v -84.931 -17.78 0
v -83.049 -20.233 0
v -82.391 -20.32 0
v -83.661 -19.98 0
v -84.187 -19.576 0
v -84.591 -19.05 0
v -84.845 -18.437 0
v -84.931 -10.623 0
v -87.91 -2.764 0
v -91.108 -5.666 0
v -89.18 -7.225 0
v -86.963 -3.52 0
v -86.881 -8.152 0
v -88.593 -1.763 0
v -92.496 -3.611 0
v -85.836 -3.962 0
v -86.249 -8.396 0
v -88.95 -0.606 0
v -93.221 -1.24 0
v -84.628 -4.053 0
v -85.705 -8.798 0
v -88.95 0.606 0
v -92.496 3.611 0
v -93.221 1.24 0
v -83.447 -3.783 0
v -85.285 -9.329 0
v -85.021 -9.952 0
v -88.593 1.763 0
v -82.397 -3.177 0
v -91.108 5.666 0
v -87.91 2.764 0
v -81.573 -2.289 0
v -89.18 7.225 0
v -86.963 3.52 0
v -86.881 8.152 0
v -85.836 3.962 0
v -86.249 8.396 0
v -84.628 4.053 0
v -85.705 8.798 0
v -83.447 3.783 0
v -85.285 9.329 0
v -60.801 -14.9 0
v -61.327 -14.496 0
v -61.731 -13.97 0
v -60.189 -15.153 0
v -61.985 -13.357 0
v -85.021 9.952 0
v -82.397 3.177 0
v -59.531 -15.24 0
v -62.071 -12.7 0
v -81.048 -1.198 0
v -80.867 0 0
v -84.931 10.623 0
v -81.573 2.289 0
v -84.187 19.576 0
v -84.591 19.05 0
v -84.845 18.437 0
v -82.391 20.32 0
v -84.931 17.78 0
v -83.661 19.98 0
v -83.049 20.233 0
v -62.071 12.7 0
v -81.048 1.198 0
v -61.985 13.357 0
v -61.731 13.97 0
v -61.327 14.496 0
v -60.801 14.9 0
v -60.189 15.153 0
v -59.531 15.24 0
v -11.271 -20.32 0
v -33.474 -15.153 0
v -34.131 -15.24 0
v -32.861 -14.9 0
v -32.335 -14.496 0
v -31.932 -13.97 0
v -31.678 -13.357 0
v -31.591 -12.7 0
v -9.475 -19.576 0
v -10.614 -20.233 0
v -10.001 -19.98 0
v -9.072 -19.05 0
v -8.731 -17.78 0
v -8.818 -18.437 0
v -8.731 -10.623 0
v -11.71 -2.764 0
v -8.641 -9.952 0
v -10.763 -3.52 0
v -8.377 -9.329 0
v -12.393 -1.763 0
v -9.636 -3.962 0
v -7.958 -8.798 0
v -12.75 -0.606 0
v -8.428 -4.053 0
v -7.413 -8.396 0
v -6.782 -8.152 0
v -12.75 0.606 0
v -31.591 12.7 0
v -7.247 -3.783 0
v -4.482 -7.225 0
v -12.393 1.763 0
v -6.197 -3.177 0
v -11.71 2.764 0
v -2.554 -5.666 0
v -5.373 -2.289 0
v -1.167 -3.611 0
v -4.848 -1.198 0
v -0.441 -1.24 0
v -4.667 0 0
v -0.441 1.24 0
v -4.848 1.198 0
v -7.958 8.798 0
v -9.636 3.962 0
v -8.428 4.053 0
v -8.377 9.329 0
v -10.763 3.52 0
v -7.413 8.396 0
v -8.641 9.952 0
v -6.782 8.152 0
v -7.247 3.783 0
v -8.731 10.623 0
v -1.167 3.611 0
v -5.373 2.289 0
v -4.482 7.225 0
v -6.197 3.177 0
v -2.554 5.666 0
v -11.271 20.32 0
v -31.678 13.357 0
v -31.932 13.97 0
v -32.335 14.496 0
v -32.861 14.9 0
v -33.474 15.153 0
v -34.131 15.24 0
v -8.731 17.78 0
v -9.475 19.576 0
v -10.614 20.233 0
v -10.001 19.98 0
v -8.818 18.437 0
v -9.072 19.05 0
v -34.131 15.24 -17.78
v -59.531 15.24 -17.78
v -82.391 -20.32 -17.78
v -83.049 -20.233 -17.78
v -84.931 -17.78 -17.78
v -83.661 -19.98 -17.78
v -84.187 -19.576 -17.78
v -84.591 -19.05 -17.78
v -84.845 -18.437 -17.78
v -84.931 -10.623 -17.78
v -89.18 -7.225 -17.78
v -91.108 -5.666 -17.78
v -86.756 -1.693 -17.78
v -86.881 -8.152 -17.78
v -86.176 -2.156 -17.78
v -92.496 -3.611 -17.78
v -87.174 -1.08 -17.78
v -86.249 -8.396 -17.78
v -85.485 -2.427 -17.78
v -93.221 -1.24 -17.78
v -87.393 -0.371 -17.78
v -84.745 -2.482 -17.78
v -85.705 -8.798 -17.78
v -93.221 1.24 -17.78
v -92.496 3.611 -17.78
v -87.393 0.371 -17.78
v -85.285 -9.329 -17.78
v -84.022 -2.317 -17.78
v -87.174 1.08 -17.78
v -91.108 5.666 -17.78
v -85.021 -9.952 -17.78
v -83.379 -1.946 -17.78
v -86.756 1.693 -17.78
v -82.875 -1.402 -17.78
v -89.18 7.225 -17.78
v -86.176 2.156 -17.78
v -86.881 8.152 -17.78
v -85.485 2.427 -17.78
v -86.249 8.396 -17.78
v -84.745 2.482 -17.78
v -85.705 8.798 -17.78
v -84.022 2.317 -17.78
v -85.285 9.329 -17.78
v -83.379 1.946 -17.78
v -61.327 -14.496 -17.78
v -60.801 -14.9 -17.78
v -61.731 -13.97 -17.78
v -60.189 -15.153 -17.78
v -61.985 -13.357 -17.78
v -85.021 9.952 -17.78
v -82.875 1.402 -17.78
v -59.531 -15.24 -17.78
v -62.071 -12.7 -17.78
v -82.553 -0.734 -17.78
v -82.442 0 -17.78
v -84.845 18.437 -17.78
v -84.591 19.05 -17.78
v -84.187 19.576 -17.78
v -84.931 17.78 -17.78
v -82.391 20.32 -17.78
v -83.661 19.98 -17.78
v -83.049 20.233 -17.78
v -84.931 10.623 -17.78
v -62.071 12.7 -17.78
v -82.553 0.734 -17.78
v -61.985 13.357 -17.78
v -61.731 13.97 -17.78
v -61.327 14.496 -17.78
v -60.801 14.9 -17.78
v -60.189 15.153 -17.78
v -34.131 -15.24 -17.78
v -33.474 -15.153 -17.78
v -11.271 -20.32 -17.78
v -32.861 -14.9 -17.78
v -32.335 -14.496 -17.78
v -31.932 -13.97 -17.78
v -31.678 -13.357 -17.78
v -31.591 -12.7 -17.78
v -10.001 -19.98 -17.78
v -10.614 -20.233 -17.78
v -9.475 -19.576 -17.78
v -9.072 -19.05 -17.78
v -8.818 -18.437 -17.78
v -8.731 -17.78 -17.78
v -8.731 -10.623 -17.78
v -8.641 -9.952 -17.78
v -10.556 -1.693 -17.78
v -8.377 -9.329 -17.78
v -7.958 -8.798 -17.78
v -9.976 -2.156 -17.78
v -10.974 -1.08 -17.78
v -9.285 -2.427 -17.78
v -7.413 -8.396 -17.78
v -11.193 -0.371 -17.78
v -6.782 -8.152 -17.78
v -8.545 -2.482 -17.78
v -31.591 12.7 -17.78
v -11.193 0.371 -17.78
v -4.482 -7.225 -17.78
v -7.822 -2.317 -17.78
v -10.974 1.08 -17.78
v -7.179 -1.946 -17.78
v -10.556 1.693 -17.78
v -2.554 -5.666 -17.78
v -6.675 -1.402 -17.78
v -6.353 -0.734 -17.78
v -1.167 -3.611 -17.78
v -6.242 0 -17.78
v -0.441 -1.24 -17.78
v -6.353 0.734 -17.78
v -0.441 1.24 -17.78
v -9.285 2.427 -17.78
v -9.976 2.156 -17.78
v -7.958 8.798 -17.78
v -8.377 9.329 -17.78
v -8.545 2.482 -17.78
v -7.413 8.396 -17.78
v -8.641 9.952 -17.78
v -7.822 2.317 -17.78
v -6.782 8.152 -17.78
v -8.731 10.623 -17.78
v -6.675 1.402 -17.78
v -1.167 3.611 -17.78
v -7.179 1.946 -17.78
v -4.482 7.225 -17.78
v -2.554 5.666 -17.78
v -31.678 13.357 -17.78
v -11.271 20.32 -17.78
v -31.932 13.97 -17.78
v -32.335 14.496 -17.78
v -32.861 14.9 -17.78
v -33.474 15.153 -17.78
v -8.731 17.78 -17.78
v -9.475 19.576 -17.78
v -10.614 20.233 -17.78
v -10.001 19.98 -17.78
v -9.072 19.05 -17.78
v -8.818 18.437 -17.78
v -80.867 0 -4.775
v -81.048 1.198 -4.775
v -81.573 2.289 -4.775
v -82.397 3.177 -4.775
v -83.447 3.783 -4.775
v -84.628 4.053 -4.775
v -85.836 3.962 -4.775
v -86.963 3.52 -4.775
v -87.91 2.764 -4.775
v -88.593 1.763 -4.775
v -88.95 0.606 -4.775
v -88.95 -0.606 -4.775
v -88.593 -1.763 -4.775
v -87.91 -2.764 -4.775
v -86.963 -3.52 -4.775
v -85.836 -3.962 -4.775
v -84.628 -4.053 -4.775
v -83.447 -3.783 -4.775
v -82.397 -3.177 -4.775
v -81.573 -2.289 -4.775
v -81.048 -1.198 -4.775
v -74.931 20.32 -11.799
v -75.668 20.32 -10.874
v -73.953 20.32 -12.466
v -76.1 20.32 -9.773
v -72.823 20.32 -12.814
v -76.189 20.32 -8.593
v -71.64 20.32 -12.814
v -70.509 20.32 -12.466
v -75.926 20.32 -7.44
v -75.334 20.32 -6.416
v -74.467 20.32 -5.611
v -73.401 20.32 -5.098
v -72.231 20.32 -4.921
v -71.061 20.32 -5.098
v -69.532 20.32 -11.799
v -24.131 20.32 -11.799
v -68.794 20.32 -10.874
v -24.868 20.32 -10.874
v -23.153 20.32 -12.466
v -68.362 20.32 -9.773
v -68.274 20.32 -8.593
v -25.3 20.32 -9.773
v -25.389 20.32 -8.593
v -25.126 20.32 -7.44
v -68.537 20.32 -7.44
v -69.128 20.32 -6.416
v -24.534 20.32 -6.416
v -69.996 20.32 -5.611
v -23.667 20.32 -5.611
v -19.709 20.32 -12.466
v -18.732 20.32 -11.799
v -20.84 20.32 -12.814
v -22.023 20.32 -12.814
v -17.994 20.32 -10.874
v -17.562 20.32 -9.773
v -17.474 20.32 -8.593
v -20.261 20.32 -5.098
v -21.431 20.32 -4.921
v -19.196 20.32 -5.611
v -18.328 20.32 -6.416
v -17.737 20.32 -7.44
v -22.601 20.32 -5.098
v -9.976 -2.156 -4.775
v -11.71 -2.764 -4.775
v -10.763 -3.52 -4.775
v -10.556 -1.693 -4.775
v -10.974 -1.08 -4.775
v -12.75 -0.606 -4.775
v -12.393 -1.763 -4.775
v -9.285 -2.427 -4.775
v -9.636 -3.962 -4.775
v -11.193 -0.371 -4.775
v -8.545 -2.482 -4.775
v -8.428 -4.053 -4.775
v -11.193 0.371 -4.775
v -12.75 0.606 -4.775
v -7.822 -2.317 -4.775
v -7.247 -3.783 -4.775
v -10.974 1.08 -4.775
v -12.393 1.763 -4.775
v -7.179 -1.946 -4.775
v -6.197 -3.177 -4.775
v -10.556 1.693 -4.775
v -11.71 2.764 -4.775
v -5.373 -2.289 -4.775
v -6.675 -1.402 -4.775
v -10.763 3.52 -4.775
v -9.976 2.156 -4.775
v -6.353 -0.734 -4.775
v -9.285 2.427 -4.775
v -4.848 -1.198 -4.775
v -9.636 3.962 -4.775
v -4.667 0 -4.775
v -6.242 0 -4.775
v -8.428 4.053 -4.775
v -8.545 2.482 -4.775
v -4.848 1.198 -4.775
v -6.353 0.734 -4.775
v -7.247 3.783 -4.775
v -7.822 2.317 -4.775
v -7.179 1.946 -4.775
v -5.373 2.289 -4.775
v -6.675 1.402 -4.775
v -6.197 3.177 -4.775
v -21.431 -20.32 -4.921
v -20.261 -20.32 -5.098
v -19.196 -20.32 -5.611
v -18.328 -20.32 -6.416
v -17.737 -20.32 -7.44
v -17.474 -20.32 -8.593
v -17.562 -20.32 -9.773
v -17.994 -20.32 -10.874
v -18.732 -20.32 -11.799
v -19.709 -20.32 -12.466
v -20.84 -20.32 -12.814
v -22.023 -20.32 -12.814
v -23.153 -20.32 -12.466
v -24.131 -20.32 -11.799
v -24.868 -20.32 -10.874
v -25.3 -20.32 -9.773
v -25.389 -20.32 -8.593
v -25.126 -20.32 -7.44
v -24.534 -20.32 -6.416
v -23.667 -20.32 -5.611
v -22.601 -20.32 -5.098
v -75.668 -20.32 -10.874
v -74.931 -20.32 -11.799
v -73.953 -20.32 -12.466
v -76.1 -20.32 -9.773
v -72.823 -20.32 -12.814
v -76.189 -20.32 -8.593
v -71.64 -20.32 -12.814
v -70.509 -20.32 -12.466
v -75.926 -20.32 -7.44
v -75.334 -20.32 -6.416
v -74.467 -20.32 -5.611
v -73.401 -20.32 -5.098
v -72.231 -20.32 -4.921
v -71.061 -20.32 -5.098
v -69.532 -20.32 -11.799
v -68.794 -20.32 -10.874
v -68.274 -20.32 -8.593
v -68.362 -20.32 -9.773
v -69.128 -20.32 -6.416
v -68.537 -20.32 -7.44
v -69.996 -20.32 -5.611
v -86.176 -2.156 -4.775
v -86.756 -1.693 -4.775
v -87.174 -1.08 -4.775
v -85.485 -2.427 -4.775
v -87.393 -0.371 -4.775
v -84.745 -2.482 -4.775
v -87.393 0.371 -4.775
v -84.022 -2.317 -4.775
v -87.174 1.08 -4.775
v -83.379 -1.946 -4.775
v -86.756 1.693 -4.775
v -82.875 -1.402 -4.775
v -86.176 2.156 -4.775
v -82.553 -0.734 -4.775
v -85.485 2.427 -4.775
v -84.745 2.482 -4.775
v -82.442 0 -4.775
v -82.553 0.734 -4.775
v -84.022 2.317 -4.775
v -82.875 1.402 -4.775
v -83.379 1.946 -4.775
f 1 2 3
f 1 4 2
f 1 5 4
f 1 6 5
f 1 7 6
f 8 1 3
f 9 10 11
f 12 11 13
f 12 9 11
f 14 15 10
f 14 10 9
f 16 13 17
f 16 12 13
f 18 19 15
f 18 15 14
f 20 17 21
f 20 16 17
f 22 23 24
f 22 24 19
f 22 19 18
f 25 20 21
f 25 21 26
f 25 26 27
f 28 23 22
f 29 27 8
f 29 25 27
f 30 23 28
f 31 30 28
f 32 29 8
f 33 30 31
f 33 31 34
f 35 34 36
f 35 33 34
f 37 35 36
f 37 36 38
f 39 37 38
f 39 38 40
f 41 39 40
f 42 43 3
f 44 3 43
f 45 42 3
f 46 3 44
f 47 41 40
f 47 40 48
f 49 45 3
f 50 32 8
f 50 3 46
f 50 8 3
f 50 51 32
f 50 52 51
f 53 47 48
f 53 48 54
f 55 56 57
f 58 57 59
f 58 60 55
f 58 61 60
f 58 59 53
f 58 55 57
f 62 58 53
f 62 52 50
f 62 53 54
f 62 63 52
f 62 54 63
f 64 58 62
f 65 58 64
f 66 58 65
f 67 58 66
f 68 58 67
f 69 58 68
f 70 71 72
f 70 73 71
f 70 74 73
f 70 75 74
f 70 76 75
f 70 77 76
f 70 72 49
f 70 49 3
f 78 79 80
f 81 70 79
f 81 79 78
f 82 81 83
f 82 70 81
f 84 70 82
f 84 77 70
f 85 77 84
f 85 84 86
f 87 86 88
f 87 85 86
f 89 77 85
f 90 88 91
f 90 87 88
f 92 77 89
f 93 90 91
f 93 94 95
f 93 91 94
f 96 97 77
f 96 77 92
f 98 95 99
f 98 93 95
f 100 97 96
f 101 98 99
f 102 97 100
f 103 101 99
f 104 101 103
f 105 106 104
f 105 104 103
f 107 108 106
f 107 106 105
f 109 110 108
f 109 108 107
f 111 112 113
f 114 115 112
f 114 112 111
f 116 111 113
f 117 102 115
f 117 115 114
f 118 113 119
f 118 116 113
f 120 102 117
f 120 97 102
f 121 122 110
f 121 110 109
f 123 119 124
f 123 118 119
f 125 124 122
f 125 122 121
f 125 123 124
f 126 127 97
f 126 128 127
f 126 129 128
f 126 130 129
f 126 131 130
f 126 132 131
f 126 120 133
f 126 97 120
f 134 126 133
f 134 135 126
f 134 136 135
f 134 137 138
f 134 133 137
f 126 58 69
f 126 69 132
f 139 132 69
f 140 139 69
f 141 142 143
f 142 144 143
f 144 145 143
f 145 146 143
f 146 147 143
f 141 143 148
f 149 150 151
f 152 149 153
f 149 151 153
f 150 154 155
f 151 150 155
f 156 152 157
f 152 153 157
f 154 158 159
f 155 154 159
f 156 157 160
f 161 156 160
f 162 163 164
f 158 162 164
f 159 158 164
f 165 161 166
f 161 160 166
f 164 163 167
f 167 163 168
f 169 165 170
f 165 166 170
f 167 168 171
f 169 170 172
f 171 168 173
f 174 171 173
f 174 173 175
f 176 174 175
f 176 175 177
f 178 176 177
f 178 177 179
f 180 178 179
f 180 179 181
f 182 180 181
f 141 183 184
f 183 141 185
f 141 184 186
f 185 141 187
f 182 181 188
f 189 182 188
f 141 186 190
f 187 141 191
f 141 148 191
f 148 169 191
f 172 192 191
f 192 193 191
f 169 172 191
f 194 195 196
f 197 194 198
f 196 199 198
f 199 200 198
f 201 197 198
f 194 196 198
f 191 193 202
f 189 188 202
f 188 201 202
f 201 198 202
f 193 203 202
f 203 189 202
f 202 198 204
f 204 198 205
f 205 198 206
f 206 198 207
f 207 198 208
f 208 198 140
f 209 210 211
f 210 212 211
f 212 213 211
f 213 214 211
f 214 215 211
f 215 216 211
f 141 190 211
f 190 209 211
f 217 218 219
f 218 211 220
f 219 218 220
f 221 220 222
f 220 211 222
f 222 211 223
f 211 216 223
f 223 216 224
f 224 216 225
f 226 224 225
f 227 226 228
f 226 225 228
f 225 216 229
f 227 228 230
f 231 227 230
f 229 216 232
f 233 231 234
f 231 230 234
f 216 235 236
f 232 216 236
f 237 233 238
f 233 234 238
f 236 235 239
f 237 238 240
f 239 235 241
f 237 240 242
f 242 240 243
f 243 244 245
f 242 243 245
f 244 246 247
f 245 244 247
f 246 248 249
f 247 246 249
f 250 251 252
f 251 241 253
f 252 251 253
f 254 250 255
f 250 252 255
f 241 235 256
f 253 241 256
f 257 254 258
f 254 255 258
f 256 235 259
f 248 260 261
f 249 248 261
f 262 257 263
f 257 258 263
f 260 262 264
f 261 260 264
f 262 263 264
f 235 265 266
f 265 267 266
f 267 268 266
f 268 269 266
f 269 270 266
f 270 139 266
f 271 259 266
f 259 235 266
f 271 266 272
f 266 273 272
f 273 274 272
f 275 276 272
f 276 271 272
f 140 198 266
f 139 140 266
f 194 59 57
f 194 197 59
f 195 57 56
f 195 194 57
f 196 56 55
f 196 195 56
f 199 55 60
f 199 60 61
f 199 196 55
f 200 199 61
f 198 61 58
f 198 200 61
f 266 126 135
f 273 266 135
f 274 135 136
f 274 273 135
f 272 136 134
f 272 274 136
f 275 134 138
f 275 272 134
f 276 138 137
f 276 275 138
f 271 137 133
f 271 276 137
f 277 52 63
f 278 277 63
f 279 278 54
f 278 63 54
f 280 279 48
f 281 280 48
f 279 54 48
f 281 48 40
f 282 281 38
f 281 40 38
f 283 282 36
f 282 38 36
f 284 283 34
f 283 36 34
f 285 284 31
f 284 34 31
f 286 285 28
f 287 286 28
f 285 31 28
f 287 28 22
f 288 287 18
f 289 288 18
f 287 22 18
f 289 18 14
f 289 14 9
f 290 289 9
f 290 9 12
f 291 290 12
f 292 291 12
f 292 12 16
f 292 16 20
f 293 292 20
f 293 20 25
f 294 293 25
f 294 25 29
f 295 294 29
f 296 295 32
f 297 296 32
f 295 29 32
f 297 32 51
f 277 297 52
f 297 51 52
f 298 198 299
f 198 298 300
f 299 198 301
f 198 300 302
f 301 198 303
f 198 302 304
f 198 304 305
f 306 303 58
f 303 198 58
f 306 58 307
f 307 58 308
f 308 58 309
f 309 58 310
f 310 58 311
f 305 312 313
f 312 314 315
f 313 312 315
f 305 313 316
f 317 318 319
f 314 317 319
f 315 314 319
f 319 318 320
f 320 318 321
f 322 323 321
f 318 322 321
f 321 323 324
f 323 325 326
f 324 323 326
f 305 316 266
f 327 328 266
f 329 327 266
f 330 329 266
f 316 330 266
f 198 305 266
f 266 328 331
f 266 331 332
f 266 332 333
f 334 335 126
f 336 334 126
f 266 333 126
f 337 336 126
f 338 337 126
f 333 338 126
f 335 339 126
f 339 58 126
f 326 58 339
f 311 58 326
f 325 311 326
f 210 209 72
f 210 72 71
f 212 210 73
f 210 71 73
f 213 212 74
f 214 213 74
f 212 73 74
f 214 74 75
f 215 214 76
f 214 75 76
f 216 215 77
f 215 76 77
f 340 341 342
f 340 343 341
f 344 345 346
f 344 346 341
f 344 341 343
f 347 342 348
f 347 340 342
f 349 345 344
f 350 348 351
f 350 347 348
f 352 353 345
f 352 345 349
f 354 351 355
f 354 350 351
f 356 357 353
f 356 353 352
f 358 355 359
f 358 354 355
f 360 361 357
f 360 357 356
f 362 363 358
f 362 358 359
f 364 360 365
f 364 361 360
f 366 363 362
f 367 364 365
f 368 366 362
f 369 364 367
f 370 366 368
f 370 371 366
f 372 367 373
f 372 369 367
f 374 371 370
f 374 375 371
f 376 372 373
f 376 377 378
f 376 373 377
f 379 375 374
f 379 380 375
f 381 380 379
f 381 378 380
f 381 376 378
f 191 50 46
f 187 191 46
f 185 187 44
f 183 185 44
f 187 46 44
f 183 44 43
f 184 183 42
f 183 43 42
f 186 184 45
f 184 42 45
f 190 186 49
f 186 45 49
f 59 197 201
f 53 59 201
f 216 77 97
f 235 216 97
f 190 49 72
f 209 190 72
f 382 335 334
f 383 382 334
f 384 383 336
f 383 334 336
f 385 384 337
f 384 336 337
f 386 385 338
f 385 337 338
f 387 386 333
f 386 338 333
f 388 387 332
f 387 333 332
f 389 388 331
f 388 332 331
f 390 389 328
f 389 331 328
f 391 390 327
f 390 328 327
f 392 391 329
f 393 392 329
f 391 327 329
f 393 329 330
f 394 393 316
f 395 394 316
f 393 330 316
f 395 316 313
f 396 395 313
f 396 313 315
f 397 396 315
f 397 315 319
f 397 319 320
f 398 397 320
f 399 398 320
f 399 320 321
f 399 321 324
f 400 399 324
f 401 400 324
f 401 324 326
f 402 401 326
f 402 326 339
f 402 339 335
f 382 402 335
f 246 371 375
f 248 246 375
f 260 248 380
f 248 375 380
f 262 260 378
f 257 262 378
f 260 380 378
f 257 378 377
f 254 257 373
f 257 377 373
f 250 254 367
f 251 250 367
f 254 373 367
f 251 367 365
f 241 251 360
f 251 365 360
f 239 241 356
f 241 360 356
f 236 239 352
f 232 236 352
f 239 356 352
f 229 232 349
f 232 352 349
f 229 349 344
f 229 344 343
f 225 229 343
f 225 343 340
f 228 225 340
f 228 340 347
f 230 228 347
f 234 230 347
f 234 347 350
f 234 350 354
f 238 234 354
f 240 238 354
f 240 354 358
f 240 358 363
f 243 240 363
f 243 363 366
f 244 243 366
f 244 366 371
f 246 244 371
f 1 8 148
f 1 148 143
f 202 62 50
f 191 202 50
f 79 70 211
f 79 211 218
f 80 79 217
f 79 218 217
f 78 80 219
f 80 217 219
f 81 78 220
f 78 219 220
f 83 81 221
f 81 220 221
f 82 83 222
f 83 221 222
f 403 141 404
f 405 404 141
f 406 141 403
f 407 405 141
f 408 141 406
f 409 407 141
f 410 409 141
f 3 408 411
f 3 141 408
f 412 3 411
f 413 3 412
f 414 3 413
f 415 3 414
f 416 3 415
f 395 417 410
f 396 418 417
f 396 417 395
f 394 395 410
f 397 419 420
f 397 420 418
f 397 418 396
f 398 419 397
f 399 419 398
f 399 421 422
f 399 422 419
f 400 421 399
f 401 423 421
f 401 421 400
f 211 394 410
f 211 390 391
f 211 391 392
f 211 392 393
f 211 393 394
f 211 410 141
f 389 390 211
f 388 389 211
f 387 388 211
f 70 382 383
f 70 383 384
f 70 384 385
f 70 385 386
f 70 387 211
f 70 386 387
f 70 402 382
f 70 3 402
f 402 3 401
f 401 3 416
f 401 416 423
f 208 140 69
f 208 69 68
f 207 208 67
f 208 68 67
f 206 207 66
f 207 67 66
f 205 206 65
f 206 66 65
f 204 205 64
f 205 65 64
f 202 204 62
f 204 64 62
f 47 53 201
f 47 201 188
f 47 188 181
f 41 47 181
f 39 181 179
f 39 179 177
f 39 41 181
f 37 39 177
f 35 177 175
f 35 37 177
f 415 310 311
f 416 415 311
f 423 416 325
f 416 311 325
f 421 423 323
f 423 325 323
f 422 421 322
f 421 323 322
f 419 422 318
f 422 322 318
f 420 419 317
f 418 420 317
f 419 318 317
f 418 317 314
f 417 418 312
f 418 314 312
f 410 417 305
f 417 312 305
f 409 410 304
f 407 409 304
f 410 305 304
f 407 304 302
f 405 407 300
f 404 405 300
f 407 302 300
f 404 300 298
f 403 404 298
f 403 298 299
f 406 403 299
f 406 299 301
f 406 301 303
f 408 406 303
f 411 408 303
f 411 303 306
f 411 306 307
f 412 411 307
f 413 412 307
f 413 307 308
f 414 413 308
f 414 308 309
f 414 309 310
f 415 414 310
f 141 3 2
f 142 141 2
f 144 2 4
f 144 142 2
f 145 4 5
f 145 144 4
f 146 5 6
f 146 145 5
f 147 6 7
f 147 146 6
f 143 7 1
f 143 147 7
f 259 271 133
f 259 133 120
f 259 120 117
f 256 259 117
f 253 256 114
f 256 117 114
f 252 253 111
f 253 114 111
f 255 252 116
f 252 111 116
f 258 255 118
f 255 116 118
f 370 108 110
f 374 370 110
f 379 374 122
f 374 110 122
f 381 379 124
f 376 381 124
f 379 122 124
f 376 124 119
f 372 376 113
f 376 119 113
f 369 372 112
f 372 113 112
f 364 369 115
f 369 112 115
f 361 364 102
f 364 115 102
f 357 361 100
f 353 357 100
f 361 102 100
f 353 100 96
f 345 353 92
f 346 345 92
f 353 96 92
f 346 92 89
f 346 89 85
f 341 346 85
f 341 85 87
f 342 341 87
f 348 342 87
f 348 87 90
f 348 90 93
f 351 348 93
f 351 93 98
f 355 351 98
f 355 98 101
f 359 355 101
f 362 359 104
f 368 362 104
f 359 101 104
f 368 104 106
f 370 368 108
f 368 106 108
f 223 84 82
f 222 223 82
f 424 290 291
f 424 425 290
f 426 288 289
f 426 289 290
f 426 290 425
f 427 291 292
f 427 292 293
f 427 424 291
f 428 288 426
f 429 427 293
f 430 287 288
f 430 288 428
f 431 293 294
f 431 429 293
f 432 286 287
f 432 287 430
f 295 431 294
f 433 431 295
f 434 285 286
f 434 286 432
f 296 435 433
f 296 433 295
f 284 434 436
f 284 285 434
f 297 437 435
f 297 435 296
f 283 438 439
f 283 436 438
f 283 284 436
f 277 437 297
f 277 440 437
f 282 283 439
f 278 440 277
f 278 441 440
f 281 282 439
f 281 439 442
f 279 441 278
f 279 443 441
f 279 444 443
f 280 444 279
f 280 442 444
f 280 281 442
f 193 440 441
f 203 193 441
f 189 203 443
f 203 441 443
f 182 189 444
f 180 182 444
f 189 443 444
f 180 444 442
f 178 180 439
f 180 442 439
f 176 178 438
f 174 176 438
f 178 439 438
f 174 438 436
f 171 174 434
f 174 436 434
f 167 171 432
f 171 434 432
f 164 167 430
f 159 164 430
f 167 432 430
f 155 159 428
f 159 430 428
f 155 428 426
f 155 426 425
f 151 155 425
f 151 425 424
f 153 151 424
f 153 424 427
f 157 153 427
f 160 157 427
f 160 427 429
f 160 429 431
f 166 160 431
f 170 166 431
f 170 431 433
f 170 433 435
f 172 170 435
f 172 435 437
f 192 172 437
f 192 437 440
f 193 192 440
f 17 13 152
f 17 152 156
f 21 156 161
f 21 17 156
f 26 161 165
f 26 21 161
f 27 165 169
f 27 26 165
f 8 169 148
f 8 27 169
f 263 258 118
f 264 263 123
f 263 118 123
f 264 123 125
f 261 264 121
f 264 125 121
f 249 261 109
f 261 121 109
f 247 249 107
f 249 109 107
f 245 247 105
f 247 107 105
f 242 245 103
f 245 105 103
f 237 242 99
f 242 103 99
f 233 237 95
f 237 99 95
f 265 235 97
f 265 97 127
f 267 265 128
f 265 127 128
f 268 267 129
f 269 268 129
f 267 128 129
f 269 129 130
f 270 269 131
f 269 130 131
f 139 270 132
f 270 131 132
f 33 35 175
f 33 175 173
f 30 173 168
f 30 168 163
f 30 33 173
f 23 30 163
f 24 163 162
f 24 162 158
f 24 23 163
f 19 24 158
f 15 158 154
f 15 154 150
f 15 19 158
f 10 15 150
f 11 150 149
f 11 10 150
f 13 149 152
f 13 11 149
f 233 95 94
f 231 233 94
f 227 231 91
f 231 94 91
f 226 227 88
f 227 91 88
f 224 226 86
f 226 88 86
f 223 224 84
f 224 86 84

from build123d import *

# Parameters (mm, degrees)
SKETCH1_W           = 93.6625
SKETCH1_H           = 40.64
SKETCH1_R           = 2.4892
BOSS_EXTRUDE1_DEPTH = 17.78
SKETCH6_R           = 3.96875
CUT_EXTRUDE4_DEPTH  = 104.635910312
CUT_EXTRUDE3_DEPTH  = 17.78
FILLET1_R           = 2.54
SKETCH3_R           = 4.064
CUT_EXTRUDE5_DEPTH  = 4.7752
CUT_EXTRUDE6_DEPTH  = 98.141100599


with BuildPart() as part:
    # Sketch1 → Boss-Extrude1 (new body)
    with BuildSketch(Plane.XY):
        with Locations((-46.83125, 0)):
            Rectangle(SKETCH1_W, SKETCH1_H)
        with Locations((-84.93125, 0)):
            Circle(SKETCH1_R, mode=Mode.SUBTRACT)
        with Locations((-8.73125, 0)):
            Circle(SKETCH1_R, mode=Mode.SUBTRACT)
    extrude(amount=-BOSS_EXTRUDE1_DEPTH)

    # Sketch6 → Cut-Extrude4 (cut, through all)
    with BuildSketch(Plane(origin=(0, 20.32, 0), x_dir=(1, 0, 0), z_dir=(0, 1, 0))):
        with Locations(Location((-72.23125, 8.89, 0), (0, 0, 270))):
            Circle(SKETCH6_R)
        with Locations(Location((-21.43125, 8.89, 0), (0, 0, 270))):
            Circle(SKETCH6_R)
    extrude(amount=-CUT_EXTRUDE4_DEPTH, mode=Mode.SUBTRACT)

    # Sketch5 → Cut-Extrude3 (cut)
    with BuildSketch(Plane.XY):
        with BuildLine():
            Line((-93.6625, -20.32), (-93.6625, 20.32))
            Line((-93.6625, 20.32), (-84.93125, 20.32))
            Line((-84.93125, 20.32), (-84.93125, 10.622546022))
            ThreePointArc((-84.93125, 10.622546022), (-85.477262526, 9.049137635), (-86.880552326, 8.152186482))
            ThreePointArc((-86.880552326, 8.152186482), (-93.31325, 0), (-86.880552326, -8.152186482))
            ThreePointArc((-86.880552326, -8.152186482), (-85.477262526, -9.049137635), (-84.93125, -10.622546022))
            Line((-84.93125, -10.622546022), (-84.93125, -20.32))
            Line((-84.93125, -20.32), (-93.6625, -20.32))
        make_face()
        with BuildLine():
            Line((0, -20.32), (0, 20.32))
            Line((0, 20.32), (-8.73125, 20.32))
            Line((-8.73125, 20.32), (-8.73125, 10.622546022))
            ThreePointArc((-8.73125, 10.622546022), (-8.185237474, 9.049137635), (-6.781947674, 8.152186482))
            ThreePointArc((-6.781947674, 8.152186482), (-0.34925, 0), (-6.781947674, -8.152186482))
            ThreePointArc((-6.781947674, -8.152186482), (-8.185237474, -9.049137635), (-8.73125, -10.622546022))
            Line((-8.73125, -10.622546022), (-8.73125, -20.32))
            Line((-8.73125, -20.32), (0, -20.32))
        make_face()
    extrude(amount=-CUT_EXTRUDE3_DEPTH, mode=Mode.SUBTRACT)

    # Fillet1
    fillet1_edges = [part.edges().sort_by_distance(p)[0] for p in [
        (-84.93125, 20.32, -8.89),
        (-84.93125, -20.32, -8.89),
        (-8.73125, 20.32, -8.89),
        (-8.73125, -20.32, -8.89),
    ]]
    fillet(fillet1_edges, radius=FILLET1_R)

    # Sketch3 → Cut-Extrude5 (cut)
    with BuildSketch(Plane.XY):
        with Locations((-84.93125, 0)):
            Circle(SKETCH3_R)
        with Locations((-8.73125, 0)):
            Circle(SKETCH3_R)
    extrude(amount=-CUT_EXTRUDE5_DEPTH, mode=Mode.SUBTRACT)

    # Sketch7 → Cut-Extrude6 (cut, through all)
    with BuildSketch(Plane.XY):
        with BuildLine():
            Line((-59.53125, -15.24), (-34.13125, -15.24))
            ThreePointArc((-34.13125, -15.24), (-32.335198776, -14.496051224), (-31.59125, -12.7))
            Line((-31.59125, -12.7), (-31.59125, 12.7))
            ThreePointArc((-31.59125, 12.7), (-32.335198776, 14.496051224), (-34.13125, 15.24))
            Line((-34.13125, 15.24), (-59.53125, 15.24))
            ThreePointArc((-59.53125, 15.24), (-61.327301224, 14.496051224), (-62.07125, 12.7))
            Line((-62.07125, 12.7), (-62.07125, -12.7))
            ThreePointArc((-62.07125, -12.7), (-61.327301224, -14.496051224), (-59.53125, -15.24))
        make_face()
    extrude(amount=-CUT_EXTRUDE6_DEPTH, mode=Mode.SUBTRACT)


solid = part.part
